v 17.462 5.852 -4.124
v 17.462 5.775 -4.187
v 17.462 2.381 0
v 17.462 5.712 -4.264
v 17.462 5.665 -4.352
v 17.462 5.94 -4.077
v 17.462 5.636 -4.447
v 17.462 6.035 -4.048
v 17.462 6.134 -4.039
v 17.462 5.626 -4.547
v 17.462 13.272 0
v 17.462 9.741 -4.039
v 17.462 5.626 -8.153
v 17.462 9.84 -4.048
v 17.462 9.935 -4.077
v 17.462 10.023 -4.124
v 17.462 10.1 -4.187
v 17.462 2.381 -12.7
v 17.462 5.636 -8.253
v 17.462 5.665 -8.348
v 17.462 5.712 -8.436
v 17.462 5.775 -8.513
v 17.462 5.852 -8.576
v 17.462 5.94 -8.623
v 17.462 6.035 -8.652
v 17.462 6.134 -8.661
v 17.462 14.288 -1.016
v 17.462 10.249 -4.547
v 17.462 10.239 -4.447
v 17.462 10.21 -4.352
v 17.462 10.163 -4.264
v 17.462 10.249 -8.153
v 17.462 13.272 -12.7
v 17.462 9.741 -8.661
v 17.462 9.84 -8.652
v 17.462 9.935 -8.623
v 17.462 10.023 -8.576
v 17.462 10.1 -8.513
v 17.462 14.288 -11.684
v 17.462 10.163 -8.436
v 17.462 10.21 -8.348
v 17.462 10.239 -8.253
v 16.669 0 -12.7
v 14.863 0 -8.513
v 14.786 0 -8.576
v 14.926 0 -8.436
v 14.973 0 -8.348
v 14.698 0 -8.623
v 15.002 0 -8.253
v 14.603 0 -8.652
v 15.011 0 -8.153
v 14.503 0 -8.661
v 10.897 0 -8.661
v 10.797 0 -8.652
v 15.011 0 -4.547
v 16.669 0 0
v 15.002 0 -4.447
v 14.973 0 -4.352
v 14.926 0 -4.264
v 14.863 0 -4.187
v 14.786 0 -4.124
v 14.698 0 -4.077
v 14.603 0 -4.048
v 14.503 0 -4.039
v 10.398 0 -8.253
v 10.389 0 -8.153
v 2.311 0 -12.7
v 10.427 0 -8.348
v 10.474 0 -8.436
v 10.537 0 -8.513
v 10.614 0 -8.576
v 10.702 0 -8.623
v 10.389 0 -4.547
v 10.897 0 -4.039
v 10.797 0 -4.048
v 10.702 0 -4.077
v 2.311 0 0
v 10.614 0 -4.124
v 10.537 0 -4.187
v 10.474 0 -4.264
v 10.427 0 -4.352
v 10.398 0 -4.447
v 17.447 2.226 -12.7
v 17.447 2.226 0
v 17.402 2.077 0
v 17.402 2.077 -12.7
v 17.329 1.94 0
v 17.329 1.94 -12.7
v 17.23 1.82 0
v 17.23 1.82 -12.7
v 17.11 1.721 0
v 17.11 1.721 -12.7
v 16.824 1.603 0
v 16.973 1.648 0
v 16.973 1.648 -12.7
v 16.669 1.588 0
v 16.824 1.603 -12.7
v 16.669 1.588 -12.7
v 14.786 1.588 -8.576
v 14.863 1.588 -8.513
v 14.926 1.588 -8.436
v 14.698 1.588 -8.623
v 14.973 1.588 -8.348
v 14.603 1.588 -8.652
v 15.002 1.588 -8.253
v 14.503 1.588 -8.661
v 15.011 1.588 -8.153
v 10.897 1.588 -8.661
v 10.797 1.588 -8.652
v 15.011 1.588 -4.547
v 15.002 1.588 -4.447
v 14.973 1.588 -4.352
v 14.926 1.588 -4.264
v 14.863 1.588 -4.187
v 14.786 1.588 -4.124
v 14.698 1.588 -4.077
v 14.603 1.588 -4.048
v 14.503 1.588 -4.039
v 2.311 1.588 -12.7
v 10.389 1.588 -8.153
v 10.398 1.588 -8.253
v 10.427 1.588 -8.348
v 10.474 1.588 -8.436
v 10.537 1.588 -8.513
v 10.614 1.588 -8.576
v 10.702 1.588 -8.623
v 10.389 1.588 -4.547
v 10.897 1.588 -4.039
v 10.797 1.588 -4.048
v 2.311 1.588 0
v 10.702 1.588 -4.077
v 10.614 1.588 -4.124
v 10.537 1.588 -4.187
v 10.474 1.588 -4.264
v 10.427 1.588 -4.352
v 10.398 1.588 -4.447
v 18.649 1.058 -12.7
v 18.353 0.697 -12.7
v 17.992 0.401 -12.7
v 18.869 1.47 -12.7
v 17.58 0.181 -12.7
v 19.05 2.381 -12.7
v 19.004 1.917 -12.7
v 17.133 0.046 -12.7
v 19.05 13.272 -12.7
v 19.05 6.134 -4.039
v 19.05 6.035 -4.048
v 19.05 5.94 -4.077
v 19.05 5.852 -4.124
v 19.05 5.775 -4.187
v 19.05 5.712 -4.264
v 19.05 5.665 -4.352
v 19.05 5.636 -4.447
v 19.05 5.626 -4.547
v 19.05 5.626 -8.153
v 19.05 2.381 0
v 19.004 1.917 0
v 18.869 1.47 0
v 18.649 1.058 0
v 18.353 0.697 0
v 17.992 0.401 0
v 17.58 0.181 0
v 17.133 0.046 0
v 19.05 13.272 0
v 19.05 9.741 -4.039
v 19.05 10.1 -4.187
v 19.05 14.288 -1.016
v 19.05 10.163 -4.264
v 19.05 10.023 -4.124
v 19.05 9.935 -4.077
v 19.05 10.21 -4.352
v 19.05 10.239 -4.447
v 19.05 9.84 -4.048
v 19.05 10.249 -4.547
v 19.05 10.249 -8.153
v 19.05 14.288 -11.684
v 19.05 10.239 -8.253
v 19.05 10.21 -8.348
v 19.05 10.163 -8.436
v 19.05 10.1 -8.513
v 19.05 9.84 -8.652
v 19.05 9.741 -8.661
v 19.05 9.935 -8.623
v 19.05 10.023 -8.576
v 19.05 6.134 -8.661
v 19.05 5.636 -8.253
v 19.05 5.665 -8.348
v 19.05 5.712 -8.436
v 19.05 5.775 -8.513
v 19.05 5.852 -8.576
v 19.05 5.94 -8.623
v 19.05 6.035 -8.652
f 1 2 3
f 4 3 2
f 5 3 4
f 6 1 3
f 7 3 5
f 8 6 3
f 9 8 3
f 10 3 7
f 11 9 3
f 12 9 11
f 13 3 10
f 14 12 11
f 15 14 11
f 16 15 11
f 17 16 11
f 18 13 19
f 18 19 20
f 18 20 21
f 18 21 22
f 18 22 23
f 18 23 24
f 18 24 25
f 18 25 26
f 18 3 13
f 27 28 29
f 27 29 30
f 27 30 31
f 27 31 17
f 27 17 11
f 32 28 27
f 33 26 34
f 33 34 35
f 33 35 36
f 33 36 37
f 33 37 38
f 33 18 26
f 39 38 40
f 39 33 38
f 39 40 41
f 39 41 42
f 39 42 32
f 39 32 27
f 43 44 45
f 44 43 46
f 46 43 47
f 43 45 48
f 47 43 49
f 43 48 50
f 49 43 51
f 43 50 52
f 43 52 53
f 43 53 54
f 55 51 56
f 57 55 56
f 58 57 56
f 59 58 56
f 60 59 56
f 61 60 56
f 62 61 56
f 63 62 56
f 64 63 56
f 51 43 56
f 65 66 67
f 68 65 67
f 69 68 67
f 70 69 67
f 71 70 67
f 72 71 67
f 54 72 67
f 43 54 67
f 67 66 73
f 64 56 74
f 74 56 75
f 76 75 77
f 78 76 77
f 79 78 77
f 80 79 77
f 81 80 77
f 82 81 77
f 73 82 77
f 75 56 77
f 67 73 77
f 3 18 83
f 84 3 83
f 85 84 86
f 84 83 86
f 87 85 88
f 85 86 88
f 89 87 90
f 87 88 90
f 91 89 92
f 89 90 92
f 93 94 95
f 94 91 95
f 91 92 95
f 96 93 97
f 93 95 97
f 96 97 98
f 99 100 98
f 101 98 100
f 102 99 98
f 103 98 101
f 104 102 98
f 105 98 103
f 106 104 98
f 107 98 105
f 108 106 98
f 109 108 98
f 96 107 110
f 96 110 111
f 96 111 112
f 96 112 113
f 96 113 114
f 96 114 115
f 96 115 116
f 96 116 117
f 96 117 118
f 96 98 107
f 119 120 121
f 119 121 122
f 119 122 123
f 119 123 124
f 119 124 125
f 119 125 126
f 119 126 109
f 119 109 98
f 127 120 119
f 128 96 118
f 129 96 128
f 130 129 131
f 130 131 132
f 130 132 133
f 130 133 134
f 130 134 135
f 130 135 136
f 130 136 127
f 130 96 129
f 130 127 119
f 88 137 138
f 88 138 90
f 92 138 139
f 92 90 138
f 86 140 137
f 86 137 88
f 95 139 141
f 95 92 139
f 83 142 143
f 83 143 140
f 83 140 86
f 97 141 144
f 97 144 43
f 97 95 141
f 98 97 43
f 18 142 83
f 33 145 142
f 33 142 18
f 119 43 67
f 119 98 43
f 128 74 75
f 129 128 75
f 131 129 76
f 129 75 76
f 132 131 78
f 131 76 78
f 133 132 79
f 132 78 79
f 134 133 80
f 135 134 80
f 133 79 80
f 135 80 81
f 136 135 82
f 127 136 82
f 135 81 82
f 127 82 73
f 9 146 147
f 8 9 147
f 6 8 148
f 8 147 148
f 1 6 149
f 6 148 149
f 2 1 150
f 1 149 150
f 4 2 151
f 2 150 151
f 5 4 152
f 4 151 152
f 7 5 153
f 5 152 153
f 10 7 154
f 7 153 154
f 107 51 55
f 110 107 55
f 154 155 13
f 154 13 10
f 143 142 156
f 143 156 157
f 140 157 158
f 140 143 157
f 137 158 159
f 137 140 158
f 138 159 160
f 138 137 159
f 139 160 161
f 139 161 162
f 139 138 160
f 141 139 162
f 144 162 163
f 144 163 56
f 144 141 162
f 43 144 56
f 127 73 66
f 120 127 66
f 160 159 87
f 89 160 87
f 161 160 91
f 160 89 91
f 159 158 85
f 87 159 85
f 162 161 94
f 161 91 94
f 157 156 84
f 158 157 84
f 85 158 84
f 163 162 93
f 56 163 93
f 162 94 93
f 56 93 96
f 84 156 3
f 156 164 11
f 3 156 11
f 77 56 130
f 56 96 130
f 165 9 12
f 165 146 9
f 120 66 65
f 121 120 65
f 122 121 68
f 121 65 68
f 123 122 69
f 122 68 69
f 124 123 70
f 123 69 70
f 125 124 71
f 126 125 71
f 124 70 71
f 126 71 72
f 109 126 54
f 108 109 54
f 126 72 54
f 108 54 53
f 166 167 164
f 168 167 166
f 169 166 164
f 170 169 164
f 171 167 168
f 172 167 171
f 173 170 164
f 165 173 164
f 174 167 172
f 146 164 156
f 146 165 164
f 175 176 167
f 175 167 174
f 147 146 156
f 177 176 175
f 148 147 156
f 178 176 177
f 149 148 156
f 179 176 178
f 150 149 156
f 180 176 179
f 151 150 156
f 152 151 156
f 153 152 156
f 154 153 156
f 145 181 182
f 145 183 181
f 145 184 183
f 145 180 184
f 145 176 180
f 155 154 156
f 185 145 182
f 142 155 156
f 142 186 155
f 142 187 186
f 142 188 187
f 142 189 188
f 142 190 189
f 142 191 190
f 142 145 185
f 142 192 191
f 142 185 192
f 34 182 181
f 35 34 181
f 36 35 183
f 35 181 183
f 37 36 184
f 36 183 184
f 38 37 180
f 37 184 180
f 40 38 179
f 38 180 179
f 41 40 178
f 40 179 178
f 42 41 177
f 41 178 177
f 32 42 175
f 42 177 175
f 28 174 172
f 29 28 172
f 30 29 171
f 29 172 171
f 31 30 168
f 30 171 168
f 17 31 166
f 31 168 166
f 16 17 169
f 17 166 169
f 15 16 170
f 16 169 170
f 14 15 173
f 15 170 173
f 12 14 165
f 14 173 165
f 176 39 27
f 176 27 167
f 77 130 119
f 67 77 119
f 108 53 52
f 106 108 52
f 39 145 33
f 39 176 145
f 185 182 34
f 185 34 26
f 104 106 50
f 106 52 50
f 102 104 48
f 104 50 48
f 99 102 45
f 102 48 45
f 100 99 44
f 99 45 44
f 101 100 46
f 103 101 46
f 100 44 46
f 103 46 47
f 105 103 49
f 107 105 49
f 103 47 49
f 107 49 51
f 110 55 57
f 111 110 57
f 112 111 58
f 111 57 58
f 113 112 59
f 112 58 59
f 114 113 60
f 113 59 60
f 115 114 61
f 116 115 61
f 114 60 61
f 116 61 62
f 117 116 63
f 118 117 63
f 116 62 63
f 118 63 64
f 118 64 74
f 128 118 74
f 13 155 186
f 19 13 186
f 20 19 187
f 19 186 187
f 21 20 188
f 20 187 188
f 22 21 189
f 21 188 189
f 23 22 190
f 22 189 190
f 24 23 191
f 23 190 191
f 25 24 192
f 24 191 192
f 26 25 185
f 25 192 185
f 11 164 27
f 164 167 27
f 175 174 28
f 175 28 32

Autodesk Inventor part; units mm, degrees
ref_plane "YZ Plane" through (0, 0, 0) normal (1, 0, 0) x (0, 1, 0)
ref_plane "XZ Plane" through (0, 0, 0) normal (0, 1, 0) x (-1, 0, 0)
sketch "Sketch1" plane through (0, 0, 0) normal (0, 1, 0) x (-1, 0, 0)
  line L0 (-19.05, 0) -> (19.05, 0)
  line L1 (19.05, 0) -> (19.05, -12.7)
  line L2 (19.05, -12.7) -> (-19.05, -12.7)
  line L3 (-19.05, -12.7) -> (-19.05, 0)
  line L4 (19.05, 0) -> (-19.05, -12.7) construction
  point P0 (0, 0)
  point P1 (0, 0)
  dimension "d0" = 38.1
  dimension "d1" = 12.7
extrude "Plate1" add sketch "Sketch1" along normal blind 1.5875
sketch "Sketch2" plane through (17.4625, 0, -12.7) normal (1, 0, 0) x (0, 1, 0)
  line L0 (0, 12.7) -> (0, 0)
  line L1 (0, 0) -> (14.2875, 0)
  line L2 (14.2875, 0) -> (14.2875, 12.7)
  line L3 (14.2875, 12.7) -> (0, 12.7)
edge flange "Flanges" height 12.7 angle 90 thickness 1.5875 bend radius 0.7937 thickness toward (1, 0, 0) relief tear relief width 1.5875 relief depth 0.7937 corner gap 1.5875 corner form 0 edges at (19.05, 1.5875, -6.35) (-19.05, 1.5875, -6.35) wall of the first edge with corners at (17.4625, 0, 0) (17.4625, 0, -12.7) (17.4625, 14.2875, -12.7) (17.4625, 14.2875, 0)
bend "Bend1"
corner "Corner1"
sketch "Sketch3" plane through (19.05, 2.3813, -12.7) normal (1, 0, 0) x (0, 0, -1)
  line L0 (-8.1534, 7.8676) -> (-4.5466, 7.8676)
  line L1 (-4.0386, 7.3596) -> (-4.0386, 3.7529)
  line L2 (-4.5466, 3.2449) -> (-8.1534, 3.2449)
  line L3 (-8.6614, 3.7529) -> (-8.6614, 7.3596)
  arc A0 (-8.1534, 7.8676) -> (-8.6614, 7.3596) centre (-8.1534, 7.3596) ccw
  arc A1 (-4.0386, 7.3596) -> (-4.5466, 7.8676) centre (-4.5466, 7.3596) ccw
  arc A2 (-4.5466, 3.2449) -> (-4.0386, 3.7529) centre (-4.5466, 3.7529) ccw
  arc A3 (-8.6614, 3.7529) -> (-8.1534, 3.2449) centre (-8.1534, 3.7529) ccw
  line L4 (-12.7, 0) -> (-12.7, 11.9063) construction
  line L5 (-12.7, 11.9063) -> (0, 11.9063) construction
  line L6 (-8.1534, 7.3596) -> (-4.5466, 3.7529) construction
  point P0 (-12.7, -2.3812)
  point P1 (-4.0386, 3.2449)
  point P2 (-8.6614, 3.2449)
  point P3 (-6.35, 5.5563)
  dimension "d16" = 4.6228
  dimension "d17" = 0.508
  dimension "d20" = 6.35
  dimension "d21" = 6.35
extrude "Flange Stamp" cut sketch "Sketch3" against normal blind 1.5875
sketch "Sketch7" plane through (19.05, 2.3813, 0) normal (1, 0, 0) x (0, 0, -1)
  arc A0 (4.5466, 7.8676) -> (4.0386, 7.3596) centre (4.5466, 7.3596) ccw construction
  arc A1 (8.1534, 3.2449) -> (8.6614, 3.7529) centre (8.1534, 3.7529) ccw construction
  circle A2 centre (6.35, 5.5563) radius 2.1844
  line L0 (4.5466, 7.3596) -> (8.1534, 3.7529) construction
  point P0 (0, -2.3812)
  dimension "d46" = 4.3688
surface extrude "Flange Circle" sketch "Sketch7" against normal up to surface (1.5875 mm away) shown yes curves A2
ref_plane "Flange Pattern Plane" through (19.05, 7.9375, -4.5466) normal (0, 1, 0) x (1, 0, 0)
feature "Flange Pattern" [suppressed]
sketch "Sketch8" plane through (0, 0, 0) normal (0, -1, 0) x (1, 0, 0)
  line L0 (16.6687, 0) -> (-16.6687, 0) construction
  line L1 (14.5034, -4.0386) -> (10.8966, -4.0386)
  line L2 (10.3886, -4.5466) -> (10.3886, -8.1534)
  line L3 (10.8966, -8.6614) -> (14.5034, -8.6614)
  line L4 (15.0114, -8.1534) -> (15.0114, -4.5466)
  arc A0 (15.0114, -4.5466) -> (14.5034, -4.0386) centre (14.5034, -4.5466) ccw
  arc A1 (14.5034, -8.6614) -> (15.0114, -8.1534) centre (14.5034, -8.1534) ccw
  arc A2 (10.3886, -8.1534) -> (10.8966, -8.6614) centre (10.8966, -8.1534) ccw
  arc A3 (10.8966, -4.0386) -> (10.3886, -4.5466) centre (10.8966, -4.5466) ccw
  line L5 (14.5034, -4.5466) -> (10.8966, -8.1534) construction
  line L6 (19.05, 0) -> (19.05, -12.7) construction
  point P0 (0, 0)
  point P1 (10.3886, -8.6614)
  point P2 (15.0114, -8.6614)
  point P3 (12.7, -6.35)
  dimension "d49" = 4.6228
  dimension "d50" = 0.508
  dimension "d51" = 6.35
  dimension "d52" = 6.35
extrude "Body Stamp" cut sketch "Sketch8" against normal blind 1.5875
sketch "Sketch9" plane through (0, 0, 0) normal (0, -1, 0) x (1, 0, 0)
  arc A0 (15.0114, -4.5466) -> (14.5034, -4.0386) centre (14.5034, -4.5466) ccw construction
  arc A1 (10.3886, -8.1534) -> (10.8966, -8.6614) centre (10.8966, -8.1534) ccw construction
  line L0 (14.5034, -4.5466) -> (10.8966, -8.1534) construction
  circle A2 centre (12.7, -6.35) radius 2.1844
  point P0 (0, 0)
  dimension "d55" = 4.3688
surface extrude "Body Circle" sketch "Sketch9" against normal up to surface (1.5875 mm away) shown yes curves A2
feature "Body Pattern" [suppressed]
sketch "Arc Length" plane through (17.4625, 2.3813, 0) normal (0, 0, 1) x (1, 0, 0)
  line L0 (0, 0) -> (1.5875, 0) construction
  arc A0 (-0.7938, -0.7938) -> (0, 0) centre (-0.7937, 0) ccw construction
  line L1 (-0.7938, -2.3813) -> (-0.7938, -0.7938) construction
  arc A1 (-0.7938, -2.3813) -> (1.5875, 0) centre (-0.7937, 0) ccw construction
  point P0 (-17.4625, -2.3812)
  dimension "d85" = 3.7405
  dimension "d92" = 1.2468
sketch "Sketch13" plane through (19.05, 14.2875, 0) normal (1, 0, 0) x (0, 0, -1)
  line L0 (0, 0) -> (12.7, 0) construction
  line L1 (62.4078, 0) -> (63.4238, -1.016)
  line L2 (63.4238, -1.016) -> (64.4398, 0)
  line L3 (62.4078, 0) -> (64.4398, 0)
  line L4 (12.7, -11.9063) -> (0, -11.9062) construction
  line L5 (63.4238, -10.8903) -> (61.161, -13.1531)
  line L6 (61.161, -13.1531) -> (63.4238, -15.4159)
  line L7 (63.4238, -15.4159) -> (65.6866, -13.1531)
  line L8 (65.6866, -13.1531) -> (63.4238, -10.8903)
  line L9 (63.4238, -10.8903) -> (63.4238, -15.4159) construction
  line L10 (63.4238, -1.016) -> (63.4238, -10.8903) construction
  line L11 (0, -11.9062) -> (12.7, -11.9063) construction
  point P0 (0, -14.2875)
  dimension "d86" = 4.5256
  dimension "d88" = 1.016
  dimension "d91" = 1.016
  dimension "d102" = 63.4238
feature "Notch" [suppressed]
mirror "Notch Mirror" [suppressed]
pattern_linear "Notch Pattern" [suppressed]
chamfer "End Chamfer" distance 1.016 angle 45 4 edges at (-18.2563, 14.2875, -12.7) (18.2563, 14.2875, -12.7) (-18.2562, 14.2875, 0) (18.2562, 14.2875, 0)
sketch "Sketch14" plane through (-19.05, 2.3813, 431.8) normal (1, 0, 0) x (0, 0, -1)
  line L0 (431.8, 11.9063) -> (444.5, 11.9063) construction
  line L1 (431.8, 0) -> (431.8, 11.9063) construction
  line L2 (431.8, -2.3813) -> (444.5, -2.3813) construction
  line L3 (431.8, 11.9063) -> (444.5, 11.9063)
  line L4 (444.5, 11.9063) -> (444.5, -2.3813)
  line L5 (444.5, -2.3813) -> (431.8, -2.3813)
  line L6 (431.8, -2.3813) -> (431.8, 11.9063)
  point P0 (431.8, -2.3812)
  point P1 (382.0521, -1.9844)
extrude "Half Cut" cut sketch "Sketch14" along normal blind 21.3614
sketch "Flange Pattern Sketch" plane through (19.05, 7.9375, -4.5466) normal (0, 1, 0) x (1, 0, 0)
  line L0 (0, 3.6068) -> (0, 0) construction
  line L1 (-45.8186, -4.5466) -> (8.2118, -4.5466) construction
  line L2 (0, 0) -> (-1.5875, 0) construction
  point P0 (-19.05, -4.5466)
  point P1 (0, 1.8034)
  point P2 (0, 14.5034)
  point P3 (0, 27.2034)
  point P4 (0, 39.9034)
  point P5 (0, 52.6034)
  point P6 (0, 65.3034)
  point P7 (0, 78.0034)
  point P8 (0, 90.7034)
  point P9 (0, 103.4034)
  point P10 (0, 116.1034)
  point P11 (0, 128.8034)
  point P12 (0, 141.5034)
  point P13 (0, 154.2034)
  point P14 (0, 166.9034)
  point P15 (0, 179.6034)
  point P16 (0, 192.3034)
  point P17 (0, 205.0034)
  point P18 (0, 217.7034)
  point P19 (0, 230.4034)
  point P20 (0, 243.1034)
  point P21 (0, 255.8034)
  point P22 (0, 268.5034)
  point P23 (0, 281.2034)
  point P24 (0, 293.9034)
  point P25 (0, 306.6034)
  point P26 (0, 319.3034)
  point P27 (0, 332.0034)
  point P28 (0, 344.7034)
  point P29 (0, 357.4034)
  point P30 (0, 370.1034)
  point P31 (0, 382.8034)
  point P32 (0, 395.5034)
  point P33 (0, 408.2034)
  point P34 (0, 420.9034)
  point P35 (0, 433.6034)
  dimension "d131" = 12.7
  dimension "d134" = 12.7
sketch "Body Pattern Sketch" plane through (0, 0, 0) normal (0, -1, 0) x (1, 0, 0)
  line L0 (16.6687, 0) -> (-16.6687, 0) construction
  line L1 (19.05, 0) -> (19.05, -12.7) construction
  circle A0 centre (12.7, -6.35) radius 2.1844 construction
  point P0 (0, 0)
  point P1 (12.7, -19.05)
  point P2 (12.7, -31.75)
  point P3 (12.7, -44.45)
  point P4 (12.7, -57.15)
  point P5 (12.7, -69.85)
  point P6 (12.7, -82.55)
  point P7 (12.7, -95.25)
  point P8 (12.7, -107.95)
  point P9 (12.7, -120.65)
  point P10 (12.7, -133.35)
  point P11 (12.7, -146.05)
  point P12 (12.7, -158.75)
  point P13 (12.7, -171.45)
  point P14 (12.7, -184.15)
  point P15 (12.7, -196.85)
  point P16 (12.7, -209.55)
  point P17 (12.7, -222.25)
  point P18 (12.7, -234.95)
  point P19 (12.7, -247.65)
  point P20 (12.7, -260.35)
  point P21 (12.7, -273.05)
  point P22 (12.7, -285.75)
  point P23 (12.7, -298.45)
  point P24 (12.7, -311.15)
  point P25 (12.7, -323.85)
  point P26 (12.7, -336.55)
  point P27 (12.7, -349.25)
  point P28 (12.7, -361.95)
  point P29 (12.7, -374.65)
  point P30 (12.7, -387.35)
  point P31 (12.7, -400.05)
  point P32 (12.7, -412.75)
  point P33 (12.7, -425.45)
  point P34 (12.7, -438.15)
  dimension "d62" = 12.7
  dimension "d65" = 12.7
  dimension "d139" = 12.7
equation "\"d1\" = 12.7 * Length"
equation "\"d18\" = Thickness"
equation "\"d53\" = Thickness"
equation "\"d89\" = Thickness"
equation "\"d2\" = Thickness"
equation "\"d3\" = BendReliefWidth"
equation "\"d4\" = BendReliefDepth"
equation "\"d5\" = MinimumRemnant"
equation "\"d6\" = TransitionRadius"
equation "\"d10\" = CornerReliefSize"
equation "\"d11\" = GapSize"
equation "\"d12\" = JacobiRadiusSize"
equation "\"BendRadius\" = Thickness"
equation "\"BendReliefWidth\" = Thickness"
equation "\"BendReliefDepth\" = 0.5 * Thickness"
equation "\"CornerReliefSize\" = 4 * Thickness"
equation "\"MinimumRemnant\" = 2 * Thickness"
equation "\"TransitionRadius\" = BendRadius"
equation "\"JacobiRadiusSize\" = BendRadius"
equation "\"GapSize\" = Thickness"
equation "\"Length\" = 1"
equation "\"Thickness\" = 1.5875"
properties part number "Alu C 1x3x1x35"
